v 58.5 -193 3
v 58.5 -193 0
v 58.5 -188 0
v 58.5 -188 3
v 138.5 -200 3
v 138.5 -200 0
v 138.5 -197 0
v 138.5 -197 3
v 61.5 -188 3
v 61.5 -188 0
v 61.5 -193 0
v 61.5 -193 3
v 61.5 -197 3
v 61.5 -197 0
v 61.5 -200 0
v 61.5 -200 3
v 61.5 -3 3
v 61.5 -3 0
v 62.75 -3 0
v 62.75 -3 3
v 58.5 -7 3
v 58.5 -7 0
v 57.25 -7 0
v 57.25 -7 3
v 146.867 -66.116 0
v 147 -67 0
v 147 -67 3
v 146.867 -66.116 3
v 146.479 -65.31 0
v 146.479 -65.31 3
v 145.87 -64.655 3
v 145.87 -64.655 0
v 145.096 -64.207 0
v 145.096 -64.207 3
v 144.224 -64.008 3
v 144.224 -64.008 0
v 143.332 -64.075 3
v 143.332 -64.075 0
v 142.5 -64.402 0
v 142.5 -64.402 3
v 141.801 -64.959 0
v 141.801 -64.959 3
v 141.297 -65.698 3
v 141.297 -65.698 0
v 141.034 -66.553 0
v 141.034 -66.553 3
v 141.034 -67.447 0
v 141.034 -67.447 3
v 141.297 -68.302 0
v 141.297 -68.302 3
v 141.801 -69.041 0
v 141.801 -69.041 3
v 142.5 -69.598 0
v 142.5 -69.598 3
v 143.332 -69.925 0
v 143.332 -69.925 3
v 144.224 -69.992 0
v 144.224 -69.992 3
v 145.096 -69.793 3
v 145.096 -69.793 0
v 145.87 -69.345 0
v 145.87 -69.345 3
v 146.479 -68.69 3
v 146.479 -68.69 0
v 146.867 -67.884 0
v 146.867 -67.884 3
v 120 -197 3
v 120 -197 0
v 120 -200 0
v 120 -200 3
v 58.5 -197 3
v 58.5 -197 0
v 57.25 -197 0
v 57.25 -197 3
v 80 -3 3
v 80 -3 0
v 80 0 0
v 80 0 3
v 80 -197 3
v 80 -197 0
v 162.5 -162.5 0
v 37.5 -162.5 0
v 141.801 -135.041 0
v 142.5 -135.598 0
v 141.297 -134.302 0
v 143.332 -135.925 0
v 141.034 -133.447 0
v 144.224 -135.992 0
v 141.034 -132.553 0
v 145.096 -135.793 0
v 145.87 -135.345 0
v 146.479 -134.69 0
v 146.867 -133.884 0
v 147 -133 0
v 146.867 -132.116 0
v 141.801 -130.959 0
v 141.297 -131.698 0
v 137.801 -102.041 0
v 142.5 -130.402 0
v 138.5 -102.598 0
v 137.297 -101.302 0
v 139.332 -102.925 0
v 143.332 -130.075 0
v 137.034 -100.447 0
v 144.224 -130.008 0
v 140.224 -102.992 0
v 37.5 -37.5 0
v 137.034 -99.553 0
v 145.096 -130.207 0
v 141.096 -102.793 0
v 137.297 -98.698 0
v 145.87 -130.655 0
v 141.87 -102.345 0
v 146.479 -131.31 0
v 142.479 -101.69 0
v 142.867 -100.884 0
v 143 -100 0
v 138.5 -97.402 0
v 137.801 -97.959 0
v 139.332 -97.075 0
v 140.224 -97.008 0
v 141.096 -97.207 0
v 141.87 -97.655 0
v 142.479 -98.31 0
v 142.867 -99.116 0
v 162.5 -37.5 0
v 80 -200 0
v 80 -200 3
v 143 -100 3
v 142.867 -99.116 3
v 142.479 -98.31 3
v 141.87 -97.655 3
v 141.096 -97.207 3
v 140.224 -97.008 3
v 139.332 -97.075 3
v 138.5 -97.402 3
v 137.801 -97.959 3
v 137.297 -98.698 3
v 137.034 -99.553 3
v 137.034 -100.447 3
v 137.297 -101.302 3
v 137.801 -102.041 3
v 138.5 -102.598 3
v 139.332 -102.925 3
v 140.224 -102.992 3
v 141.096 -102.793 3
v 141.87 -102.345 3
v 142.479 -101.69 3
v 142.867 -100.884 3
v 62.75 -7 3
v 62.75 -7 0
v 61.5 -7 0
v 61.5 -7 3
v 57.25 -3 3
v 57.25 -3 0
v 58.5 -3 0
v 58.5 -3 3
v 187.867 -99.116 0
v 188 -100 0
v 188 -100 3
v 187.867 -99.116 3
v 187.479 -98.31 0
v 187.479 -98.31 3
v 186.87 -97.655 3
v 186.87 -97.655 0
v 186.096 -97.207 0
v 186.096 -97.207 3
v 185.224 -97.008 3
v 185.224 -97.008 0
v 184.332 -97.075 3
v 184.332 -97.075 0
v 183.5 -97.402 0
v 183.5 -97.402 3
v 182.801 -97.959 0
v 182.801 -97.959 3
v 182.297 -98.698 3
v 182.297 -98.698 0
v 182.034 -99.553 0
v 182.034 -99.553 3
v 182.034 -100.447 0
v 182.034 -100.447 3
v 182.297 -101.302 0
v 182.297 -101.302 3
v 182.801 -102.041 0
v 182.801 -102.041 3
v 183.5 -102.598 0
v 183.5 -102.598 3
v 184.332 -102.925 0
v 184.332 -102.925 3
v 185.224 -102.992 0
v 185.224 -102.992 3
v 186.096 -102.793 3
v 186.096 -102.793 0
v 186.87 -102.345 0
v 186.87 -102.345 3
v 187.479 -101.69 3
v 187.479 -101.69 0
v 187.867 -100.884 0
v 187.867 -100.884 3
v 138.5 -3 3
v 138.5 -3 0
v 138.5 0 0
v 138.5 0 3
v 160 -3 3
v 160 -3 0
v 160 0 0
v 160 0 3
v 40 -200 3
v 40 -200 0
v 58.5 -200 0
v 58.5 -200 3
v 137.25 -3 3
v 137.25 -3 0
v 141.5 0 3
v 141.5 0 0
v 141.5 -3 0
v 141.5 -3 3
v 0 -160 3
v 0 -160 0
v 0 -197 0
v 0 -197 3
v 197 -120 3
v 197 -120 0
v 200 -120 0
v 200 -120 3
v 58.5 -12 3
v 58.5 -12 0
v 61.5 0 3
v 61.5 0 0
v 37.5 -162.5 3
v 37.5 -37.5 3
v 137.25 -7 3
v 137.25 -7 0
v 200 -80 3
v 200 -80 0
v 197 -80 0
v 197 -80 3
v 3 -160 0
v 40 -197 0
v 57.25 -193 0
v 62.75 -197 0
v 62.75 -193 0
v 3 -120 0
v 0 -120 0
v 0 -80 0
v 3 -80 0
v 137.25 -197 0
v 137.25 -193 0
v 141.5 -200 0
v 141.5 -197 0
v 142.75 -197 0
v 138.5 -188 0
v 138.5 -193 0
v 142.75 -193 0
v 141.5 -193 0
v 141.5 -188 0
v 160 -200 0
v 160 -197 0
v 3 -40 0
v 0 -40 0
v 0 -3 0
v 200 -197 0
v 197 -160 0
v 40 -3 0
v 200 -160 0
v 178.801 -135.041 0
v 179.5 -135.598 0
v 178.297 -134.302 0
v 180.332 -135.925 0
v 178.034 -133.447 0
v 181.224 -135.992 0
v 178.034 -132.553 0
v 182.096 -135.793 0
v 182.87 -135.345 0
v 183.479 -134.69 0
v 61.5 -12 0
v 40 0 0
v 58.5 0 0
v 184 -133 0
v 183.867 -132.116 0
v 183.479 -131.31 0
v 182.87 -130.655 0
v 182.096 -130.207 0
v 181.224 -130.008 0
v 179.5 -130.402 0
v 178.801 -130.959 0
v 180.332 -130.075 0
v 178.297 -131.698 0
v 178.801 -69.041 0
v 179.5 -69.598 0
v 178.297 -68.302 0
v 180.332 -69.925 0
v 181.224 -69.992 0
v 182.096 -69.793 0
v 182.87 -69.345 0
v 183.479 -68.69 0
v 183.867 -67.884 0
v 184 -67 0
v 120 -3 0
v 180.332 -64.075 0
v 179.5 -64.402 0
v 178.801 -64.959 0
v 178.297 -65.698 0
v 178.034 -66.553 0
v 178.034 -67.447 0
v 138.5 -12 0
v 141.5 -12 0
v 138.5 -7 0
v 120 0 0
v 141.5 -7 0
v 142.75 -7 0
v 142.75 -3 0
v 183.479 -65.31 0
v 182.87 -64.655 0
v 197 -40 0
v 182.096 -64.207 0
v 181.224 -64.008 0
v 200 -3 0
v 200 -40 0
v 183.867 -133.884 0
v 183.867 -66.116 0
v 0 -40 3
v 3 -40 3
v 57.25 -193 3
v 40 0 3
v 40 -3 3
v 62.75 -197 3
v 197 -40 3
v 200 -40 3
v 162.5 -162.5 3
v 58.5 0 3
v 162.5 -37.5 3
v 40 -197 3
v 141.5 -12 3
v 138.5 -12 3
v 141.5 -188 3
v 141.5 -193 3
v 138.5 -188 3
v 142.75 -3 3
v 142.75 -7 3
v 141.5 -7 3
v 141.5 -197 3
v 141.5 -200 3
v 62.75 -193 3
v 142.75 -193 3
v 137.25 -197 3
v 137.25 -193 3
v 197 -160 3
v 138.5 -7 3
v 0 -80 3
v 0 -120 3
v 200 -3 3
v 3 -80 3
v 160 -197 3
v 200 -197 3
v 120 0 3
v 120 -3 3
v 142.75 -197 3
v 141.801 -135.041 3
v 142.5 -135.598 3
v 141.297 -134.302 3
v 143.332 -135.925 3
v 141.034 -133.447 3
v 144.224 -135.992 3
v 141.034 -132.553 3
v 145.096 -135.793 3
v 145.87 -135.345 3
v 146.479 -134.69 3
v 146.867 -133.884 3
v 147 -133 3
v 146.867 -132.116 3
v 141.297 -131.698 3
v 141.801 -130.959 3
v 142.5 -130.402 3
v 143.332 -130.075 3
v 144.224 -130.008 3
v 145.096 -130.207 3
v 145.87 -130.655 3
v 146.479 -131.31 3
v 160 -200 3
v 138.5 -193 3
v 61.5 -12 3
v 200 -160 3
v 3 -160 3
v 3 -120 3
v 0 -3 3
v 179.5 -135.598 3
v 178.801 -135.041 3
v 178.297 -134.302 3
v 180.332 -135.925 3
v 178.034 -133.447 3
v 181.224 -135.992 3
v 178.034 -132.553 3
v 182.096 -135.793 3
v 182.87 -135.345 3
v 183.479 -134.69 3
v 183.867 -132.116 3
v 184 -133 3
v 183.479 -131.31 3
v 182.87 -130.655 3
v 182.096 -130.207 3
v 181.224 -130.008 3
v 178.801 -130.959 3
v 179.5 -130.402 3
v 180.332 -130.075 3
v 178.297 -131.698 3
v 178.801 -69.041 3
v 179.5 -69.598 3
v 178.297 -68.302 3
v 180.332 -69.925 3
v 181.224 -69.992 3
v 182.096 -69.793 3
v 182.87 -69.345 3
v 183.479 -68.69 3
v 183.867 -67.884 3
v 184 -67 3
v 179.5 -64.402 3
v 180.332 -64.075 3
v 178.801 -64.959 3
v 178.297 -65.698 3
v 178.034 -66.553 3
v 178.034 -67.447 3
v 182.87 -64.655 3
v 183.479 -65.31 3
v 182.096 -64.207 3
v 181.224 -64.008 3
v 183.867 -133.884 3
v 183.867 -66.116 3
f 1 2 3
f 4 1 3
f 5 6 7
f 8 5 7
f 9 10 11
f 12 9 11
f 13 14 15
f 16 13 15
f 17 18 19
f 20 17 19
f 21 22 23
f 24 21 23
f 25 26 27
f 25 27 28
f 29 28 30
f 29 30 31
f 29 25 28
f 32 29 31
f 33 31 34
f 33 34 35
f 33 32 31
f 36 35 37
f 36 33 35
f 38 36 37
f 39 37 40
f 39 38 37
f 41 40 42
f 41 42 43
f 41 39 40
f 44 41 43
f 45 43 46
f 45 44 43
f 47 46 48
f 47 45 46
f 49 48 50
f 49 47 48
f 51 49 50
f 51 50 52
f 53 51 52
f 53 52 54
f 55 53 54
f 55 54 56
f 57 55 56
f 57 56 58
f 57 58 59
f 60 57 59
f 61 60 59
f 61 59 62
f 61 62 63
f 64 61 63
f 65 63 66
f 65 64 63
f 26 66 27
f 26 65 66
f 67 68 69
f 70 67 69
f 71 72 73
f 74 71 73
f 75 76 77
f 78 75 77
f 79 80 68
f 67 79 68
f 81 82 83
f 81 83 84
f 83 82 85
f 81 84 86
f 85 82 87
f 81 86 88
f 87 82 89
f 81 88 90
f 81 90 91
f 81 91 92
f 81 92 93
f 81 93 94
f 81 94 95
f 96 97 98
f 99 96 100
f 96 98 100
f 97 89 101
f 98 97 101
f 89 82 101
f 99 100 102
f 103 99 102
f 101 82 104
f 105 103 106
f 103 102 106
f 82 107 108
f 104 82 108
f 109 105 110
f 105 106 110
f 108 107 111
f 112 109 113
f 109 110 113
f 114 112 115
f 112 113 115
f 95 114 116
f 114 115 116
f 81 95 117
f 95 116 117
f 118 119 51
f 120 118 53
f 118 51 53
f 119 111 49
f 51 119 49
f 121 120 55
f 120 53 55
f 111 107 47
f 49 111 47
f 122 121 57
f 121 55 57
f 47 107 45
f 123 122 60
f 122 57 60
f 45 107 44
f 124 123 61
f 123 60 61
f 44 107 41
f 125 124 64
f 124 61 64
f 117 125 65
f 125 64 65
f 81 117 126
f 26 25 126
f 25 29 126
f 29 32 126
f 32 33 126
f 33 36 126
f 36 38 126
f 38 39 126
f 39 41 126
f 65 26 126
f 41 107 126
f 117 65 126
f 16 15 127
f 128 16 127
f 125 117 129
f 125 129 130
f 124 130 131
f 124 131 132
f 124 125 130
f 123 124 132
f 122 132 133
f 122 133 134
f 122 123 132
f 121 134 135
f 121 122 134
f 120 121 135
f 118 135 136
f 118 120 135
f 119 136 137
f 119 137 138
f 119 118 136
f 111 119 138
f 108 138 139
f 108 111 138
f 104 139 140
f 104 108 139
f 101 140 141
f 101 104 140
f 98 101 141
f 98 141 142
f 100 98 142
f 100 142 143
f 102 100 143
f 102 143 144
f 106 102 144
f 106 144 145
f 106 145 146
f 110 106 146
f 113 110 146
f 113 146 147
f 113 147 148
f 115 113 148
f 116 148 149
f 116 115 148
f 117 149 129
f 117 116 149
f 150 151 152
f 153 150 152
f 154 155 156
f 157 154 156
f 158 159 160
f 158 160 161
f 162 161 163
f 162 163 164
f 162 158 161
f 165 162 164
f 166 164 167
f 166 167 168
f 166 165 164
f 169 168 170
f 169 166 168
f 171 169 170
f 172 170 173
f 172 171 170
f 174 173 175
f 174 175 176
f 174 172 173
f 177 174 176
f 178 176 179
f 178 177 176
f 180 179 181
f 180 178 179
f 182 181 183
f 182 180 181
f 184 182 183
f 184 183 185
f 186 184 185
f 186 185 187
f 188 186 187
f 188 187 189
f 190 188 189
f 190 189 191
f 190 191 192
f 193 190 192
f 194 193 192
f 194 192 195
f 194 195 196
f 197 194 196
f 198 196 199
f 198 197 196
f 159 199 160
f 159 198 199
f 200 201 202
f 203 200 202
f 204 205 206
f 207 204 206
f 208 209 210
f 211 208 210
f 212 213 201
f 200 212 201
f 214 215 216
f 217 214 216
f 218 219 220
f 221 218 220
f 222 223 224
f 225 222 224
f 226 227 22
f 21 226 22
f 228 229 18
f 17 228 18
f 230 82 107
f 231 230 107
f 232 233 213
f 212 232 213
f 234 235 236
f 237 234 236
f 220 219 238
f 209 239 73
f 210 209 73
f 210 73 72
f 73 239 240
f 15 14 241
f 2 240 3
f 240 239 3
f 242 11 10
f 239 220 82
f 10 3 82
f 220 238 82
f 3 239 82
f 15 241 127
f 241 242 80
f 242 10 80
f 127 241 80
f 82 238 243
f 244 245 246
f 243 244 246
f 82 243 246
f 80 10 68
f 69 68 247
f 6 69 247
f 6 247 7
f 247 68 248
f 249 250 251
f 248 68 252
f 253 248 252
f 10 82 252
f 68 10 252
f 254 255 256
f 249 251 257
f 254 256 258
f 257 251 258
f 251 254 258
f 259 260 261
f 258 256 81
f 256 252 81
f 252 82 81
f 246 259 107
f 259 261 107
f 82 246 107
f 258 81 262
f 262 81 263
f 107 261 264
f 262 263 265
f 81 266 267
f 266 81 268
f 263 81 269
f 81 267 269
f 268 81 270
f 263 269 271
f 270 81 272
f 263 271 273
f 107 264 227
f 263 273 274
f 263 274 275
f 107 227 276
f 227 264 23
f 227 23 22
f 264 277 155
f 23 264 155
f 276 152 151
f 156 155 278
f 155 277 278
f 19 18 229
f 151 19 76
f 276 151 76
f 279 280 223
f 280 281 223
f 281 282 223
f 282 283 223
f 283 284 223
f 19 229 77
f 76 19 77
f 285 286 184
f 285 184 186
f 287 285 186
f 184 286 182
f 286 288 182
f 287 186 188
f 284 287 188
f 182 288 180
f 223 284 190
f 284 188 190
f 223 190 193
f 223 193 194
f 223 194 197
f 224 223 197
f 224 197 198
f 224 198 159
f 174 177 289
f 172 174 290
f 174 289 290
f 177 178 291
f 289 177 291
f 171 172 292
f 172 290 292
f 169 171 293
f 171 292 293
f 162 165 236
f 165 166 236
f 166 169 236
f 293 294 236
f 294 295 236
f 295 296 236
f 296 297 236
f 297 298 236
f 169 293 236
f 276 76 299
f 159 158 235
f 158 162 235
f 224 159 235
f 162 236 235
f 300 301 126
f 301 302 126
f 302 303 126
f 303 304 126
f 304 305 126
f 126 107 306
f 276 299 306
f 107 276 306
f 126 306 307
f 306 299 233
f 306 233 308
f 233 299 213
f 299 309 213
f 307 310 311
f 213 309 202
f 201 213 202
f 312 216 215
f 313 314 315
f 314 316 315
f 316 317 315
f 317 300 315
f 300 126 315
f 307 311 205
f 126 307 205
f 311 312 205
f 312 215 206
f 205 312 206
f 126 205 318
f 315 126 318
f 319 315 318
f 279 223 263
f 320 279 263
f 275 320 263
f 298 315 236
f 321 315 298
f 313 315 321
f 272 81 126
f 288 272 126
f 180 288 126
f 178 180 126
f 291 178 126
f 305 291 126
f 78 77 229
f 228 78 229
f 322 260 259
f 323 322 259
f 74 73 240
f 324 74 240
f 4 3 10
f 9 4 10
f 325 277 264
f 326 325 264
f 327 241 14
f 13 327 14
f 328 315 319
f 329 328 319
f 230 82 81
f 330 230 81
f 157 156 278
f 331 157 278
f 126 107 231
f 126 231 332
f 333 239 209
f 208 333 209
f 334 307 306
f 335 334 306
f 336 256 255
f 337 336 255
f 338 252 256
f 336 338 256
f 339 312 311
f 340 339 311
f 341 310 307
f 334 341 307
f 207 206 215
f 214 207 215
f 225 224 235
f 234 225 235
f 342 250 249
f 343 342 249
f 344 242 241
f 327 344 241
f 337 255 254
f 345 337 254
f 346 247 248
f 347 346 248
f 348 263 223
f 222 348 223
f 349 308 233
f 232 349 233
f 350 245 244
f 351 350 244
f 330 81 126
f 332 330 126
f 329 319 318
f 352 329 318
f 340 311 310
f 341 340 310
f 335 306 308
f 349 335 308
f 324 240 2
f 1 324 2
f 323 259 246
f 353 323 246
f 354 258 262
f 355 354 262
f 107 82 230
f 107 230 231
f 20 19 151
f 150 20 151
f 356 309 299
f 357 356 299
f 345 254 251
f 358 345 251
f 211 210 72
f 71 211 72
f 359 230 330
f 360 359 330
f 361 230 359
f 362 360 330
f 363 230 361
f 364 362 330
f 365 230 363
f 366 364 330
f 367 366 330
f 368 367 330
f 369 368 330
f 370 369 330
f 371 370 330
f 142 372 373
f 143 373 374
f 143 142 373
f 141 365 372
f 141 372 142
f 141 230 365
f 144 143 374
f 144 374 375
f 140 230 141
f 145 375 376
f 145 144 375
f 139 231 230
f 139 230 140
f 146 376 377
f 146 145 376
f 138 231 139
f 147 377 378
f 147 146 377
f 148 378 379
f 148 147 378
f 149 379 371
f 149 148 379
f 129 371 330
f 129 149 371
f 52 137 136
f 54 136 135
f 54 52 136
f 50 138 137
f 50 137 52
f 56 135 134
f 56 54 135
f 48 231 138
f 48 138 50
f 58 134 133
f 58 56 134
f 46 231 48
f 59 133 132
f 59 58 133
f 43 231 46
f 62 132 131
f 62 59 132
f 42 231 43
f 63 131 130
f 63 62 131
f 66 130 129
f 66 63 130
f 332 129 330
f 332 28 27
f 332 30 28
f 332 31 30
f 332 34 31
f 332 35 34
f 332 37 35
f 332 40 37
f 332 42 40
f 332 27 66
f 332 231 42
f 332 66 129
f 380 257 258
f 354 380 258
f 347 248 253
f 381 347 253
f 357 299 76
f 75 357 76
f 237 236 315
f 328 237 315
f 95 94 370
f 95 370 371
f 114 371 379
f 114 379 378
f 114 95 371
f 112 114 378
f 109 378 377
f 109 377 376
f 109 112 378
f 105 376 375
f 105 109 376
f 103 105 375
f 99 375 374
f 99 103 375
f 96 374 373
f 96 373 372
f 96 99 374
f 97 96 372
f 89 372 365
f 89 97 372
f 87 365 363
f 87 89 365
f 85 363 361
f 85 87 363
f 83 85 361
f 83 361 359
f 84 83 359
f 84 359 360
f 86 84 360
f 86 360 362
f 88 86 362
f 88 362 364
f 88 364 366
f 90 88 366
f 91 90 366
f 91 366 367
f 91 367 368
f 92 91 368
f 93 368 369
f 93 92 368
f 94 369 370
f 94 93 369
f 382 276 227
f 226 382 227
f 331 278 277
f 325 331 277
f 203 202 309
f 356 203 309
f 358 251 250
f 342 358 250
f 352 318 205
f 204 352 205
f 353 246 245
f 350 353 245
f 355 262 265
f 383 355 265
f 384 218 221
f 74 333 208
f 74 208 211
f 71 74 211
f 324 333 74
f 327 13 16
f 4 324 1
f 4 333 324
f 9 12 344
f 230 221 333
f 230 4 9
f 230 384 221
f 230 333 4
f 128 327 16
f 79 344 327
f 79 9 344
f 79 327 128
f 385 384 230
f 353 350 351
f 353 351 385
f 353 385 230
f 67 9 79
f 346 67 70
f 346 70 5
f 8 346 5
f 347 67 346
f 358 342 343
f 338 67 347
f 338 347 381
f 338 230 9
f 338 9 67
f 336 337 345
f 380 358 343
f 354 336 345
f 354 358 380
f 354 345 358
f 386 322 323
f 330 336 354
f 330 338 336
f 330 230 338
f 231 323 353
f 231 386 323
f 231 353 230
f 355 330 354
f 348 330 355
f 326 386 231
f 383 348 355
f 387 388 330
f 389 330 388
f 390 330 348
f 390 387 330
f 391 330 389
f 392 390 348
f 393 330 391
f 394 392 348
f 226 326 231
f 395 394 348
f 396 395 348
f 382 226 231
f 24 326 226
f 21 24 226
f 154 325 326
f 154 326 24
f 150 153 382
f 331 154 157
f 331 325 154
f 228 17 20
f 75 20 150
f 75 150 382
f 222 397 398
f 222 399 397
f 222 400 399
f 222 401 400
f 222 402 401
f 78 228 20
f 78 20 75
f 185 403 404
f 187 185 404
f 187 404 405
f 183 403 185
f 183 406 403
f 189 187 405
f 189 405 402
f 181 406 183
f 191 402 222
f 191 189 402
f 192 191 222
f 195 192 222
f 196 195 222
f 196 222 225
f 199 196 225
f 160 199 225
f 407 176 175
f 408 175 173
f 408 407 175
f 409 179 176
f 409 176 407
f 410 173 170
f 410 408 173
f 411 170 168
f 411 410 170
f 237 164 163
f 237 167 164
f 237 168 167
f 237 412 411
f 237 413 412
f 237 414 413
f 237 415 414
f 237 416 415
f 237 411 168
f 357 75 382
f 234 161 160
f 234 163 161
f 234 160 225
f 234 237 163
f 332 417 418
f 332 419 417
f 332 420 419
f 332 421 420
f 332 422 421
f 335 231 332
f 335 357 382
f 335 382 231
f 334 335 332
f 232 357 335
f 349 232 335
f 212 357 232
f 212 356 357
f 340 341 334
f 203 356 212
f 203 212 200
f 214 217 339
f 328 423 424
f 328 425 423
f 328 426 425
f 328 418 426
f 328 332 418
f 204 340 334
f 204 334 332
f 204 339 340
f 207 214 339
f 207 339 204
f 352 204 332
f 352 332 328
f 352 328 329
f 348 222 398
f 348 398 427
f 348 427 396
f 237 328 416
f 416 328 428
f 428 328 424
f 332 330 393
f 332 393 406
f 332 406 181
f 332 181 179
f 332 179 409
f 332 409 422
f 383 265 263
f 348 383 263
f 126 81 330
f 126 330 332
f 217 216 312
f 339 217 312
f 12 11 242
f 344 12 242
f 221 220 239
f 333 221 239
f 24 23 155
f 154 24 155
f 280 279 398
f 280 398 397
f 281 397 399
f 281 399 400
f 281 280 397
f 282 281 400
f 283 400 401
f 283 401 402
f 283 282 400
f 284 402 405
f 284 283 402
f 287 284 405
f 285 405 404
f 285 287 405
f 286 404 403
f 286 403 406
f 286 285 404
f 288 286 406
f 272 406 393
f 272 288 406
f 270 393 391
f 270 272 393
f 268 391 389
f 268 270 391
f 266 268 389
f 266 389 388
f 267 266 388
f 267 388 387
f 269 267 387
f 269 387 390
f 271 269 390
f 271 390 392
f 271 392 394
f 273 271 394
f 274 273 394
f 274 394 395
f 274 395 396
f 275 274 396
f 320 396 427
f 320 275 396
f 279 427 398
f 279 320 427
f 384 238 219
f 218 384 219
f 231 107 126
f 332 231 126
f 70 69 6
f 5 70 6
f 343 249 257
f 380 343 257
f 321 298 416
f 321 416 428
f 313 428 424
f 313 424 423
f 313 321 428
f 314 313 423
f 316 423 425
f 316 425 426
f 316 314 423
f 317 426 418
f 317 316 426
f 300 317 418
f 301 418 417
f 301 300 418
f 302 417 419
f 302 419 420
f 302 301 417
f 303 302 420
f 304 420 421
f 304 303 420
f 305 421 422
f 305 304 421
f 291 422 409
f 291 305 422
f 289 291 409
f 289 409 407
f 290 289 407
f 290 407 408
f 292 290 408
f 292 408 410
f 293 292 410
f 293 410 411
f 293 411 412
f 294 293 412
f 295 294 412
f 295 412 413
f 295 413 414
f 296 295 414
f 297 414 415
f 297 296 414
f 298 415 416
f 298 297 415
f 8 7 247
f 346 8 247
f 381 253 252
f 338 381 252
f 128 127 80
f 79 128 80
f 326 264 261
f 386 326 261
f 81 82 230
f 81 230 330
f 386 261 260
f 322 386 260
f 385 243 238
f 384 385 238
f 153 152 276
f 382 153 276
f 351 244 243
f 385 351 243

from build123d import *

# Parameters (mm, degrees)
SKETCH_1_W      = 125
SKETCH_1_H      = 125
SKETCH_1_R      = 3
EXTRUDE_2_DEPTH = 3
SKETCH_1_6_W    = 125
SKETCH_1_6_H    = 125
SKETCH_1_6_R    = 3
EXTRUDE_4_DEPTH = 3


with BuildPart() as part:
    # 草图1 → 凸台-拉伸2 (new body)
    with BuildSketch(Plane.XY):
        Polygon((120, -3), (80, -3), (80, 0), (61.5, 0), (61.5, -3), (62.75, -3), (62.75, -7), (61.5, -7), (61.5, -12), (58.5, -12), (58.5, -7), (57.25, -7), (57.25, -3), (58.5, -3), (58.5, 0), (40, 0), (40, -3), (0, -3), (0, -40), (3, -40), (3, -80), (0, -80), (0, -120), (3, -120), (3, -160), (0, -160), (0, -197), (40, -197), (40, -200), (58.5, -200), (58.5, -197), (57.25, -197), (57.25, -193), (58.5, -193), (58.5, -188), (61.5, -188), (61.5, -193), (62.75, -193), (62.75, -197), (61.5, -197), (61.5, -200), (80, -200), (80, -197), (120, -197), (120, -200), (138.5, -200), (138.5, -197), (137.25, -197), (137.25, -193), (138.5, -193), (138.5, -188), (141.5, -188), (141.5, -193), (142.75, -193), (142.75, -197), (141.5, -197), (141.5, -200), (160, -200), (160, -197), (200, -197), (200, -160), (197, -160), (197, -120), (200, -120), (200, -80), (197, -80), (197, -40), (200, -40), (200, -3), (160, -3), (160, 0), (141.5, 0), (141.5, -3), (142.75, -3), (142.75, -7), (141.5, -7), (141.5, -12), (138.5, -12), (138.5, -7), (137.25, -7), (137.25, -3), (138.5, -3), (138.5, 0), (120, 0), align=None)
        with Locations((100, -100)):
            Rectangle(SKETCH_1_W, SKETCH_1_H, mode=Mode.SUBTRACT)
        with Locations((185, -100)):
            Circle(SKETCH_1_R, mode=Mode.SUBTRACT)
        with Locations((181, -67)):
            Circle(SKETCH_1_R, mode=Mode.SUBTRACT)
        with Locations((181, -133)):
            Circle(SKETCH_1_R, mode=Mode.SUBTRACT)
    extrude(amount=EXTRUDE_2_DEPTH)


with BuildPart() as body_2:
    # 草图1<6> → 凸台-拉伸4 (new body)
    with BuildSketch(Plane.XY):
        with Locations((100, -100)):
            Rectangle(SKETCH_1_6_W, SKETCH_1_6_H)
        with Locations((140, -100)):
            Circle(SKETCH_1_6_R, mode=Mode.SUBTRACT)
        with Locations((144, -67)):
            Circle(SKETCH_1_6_R, mode=Mode.SUBTRACT)
        with Locations((144, -133)):
            Circle(SKETCH_1_6_R, mode=Mode.SUBTRACT)
    extrude(amount=EXTRUDE_4_DEPTH)


solid = Compound([part.part, body_2.part])
